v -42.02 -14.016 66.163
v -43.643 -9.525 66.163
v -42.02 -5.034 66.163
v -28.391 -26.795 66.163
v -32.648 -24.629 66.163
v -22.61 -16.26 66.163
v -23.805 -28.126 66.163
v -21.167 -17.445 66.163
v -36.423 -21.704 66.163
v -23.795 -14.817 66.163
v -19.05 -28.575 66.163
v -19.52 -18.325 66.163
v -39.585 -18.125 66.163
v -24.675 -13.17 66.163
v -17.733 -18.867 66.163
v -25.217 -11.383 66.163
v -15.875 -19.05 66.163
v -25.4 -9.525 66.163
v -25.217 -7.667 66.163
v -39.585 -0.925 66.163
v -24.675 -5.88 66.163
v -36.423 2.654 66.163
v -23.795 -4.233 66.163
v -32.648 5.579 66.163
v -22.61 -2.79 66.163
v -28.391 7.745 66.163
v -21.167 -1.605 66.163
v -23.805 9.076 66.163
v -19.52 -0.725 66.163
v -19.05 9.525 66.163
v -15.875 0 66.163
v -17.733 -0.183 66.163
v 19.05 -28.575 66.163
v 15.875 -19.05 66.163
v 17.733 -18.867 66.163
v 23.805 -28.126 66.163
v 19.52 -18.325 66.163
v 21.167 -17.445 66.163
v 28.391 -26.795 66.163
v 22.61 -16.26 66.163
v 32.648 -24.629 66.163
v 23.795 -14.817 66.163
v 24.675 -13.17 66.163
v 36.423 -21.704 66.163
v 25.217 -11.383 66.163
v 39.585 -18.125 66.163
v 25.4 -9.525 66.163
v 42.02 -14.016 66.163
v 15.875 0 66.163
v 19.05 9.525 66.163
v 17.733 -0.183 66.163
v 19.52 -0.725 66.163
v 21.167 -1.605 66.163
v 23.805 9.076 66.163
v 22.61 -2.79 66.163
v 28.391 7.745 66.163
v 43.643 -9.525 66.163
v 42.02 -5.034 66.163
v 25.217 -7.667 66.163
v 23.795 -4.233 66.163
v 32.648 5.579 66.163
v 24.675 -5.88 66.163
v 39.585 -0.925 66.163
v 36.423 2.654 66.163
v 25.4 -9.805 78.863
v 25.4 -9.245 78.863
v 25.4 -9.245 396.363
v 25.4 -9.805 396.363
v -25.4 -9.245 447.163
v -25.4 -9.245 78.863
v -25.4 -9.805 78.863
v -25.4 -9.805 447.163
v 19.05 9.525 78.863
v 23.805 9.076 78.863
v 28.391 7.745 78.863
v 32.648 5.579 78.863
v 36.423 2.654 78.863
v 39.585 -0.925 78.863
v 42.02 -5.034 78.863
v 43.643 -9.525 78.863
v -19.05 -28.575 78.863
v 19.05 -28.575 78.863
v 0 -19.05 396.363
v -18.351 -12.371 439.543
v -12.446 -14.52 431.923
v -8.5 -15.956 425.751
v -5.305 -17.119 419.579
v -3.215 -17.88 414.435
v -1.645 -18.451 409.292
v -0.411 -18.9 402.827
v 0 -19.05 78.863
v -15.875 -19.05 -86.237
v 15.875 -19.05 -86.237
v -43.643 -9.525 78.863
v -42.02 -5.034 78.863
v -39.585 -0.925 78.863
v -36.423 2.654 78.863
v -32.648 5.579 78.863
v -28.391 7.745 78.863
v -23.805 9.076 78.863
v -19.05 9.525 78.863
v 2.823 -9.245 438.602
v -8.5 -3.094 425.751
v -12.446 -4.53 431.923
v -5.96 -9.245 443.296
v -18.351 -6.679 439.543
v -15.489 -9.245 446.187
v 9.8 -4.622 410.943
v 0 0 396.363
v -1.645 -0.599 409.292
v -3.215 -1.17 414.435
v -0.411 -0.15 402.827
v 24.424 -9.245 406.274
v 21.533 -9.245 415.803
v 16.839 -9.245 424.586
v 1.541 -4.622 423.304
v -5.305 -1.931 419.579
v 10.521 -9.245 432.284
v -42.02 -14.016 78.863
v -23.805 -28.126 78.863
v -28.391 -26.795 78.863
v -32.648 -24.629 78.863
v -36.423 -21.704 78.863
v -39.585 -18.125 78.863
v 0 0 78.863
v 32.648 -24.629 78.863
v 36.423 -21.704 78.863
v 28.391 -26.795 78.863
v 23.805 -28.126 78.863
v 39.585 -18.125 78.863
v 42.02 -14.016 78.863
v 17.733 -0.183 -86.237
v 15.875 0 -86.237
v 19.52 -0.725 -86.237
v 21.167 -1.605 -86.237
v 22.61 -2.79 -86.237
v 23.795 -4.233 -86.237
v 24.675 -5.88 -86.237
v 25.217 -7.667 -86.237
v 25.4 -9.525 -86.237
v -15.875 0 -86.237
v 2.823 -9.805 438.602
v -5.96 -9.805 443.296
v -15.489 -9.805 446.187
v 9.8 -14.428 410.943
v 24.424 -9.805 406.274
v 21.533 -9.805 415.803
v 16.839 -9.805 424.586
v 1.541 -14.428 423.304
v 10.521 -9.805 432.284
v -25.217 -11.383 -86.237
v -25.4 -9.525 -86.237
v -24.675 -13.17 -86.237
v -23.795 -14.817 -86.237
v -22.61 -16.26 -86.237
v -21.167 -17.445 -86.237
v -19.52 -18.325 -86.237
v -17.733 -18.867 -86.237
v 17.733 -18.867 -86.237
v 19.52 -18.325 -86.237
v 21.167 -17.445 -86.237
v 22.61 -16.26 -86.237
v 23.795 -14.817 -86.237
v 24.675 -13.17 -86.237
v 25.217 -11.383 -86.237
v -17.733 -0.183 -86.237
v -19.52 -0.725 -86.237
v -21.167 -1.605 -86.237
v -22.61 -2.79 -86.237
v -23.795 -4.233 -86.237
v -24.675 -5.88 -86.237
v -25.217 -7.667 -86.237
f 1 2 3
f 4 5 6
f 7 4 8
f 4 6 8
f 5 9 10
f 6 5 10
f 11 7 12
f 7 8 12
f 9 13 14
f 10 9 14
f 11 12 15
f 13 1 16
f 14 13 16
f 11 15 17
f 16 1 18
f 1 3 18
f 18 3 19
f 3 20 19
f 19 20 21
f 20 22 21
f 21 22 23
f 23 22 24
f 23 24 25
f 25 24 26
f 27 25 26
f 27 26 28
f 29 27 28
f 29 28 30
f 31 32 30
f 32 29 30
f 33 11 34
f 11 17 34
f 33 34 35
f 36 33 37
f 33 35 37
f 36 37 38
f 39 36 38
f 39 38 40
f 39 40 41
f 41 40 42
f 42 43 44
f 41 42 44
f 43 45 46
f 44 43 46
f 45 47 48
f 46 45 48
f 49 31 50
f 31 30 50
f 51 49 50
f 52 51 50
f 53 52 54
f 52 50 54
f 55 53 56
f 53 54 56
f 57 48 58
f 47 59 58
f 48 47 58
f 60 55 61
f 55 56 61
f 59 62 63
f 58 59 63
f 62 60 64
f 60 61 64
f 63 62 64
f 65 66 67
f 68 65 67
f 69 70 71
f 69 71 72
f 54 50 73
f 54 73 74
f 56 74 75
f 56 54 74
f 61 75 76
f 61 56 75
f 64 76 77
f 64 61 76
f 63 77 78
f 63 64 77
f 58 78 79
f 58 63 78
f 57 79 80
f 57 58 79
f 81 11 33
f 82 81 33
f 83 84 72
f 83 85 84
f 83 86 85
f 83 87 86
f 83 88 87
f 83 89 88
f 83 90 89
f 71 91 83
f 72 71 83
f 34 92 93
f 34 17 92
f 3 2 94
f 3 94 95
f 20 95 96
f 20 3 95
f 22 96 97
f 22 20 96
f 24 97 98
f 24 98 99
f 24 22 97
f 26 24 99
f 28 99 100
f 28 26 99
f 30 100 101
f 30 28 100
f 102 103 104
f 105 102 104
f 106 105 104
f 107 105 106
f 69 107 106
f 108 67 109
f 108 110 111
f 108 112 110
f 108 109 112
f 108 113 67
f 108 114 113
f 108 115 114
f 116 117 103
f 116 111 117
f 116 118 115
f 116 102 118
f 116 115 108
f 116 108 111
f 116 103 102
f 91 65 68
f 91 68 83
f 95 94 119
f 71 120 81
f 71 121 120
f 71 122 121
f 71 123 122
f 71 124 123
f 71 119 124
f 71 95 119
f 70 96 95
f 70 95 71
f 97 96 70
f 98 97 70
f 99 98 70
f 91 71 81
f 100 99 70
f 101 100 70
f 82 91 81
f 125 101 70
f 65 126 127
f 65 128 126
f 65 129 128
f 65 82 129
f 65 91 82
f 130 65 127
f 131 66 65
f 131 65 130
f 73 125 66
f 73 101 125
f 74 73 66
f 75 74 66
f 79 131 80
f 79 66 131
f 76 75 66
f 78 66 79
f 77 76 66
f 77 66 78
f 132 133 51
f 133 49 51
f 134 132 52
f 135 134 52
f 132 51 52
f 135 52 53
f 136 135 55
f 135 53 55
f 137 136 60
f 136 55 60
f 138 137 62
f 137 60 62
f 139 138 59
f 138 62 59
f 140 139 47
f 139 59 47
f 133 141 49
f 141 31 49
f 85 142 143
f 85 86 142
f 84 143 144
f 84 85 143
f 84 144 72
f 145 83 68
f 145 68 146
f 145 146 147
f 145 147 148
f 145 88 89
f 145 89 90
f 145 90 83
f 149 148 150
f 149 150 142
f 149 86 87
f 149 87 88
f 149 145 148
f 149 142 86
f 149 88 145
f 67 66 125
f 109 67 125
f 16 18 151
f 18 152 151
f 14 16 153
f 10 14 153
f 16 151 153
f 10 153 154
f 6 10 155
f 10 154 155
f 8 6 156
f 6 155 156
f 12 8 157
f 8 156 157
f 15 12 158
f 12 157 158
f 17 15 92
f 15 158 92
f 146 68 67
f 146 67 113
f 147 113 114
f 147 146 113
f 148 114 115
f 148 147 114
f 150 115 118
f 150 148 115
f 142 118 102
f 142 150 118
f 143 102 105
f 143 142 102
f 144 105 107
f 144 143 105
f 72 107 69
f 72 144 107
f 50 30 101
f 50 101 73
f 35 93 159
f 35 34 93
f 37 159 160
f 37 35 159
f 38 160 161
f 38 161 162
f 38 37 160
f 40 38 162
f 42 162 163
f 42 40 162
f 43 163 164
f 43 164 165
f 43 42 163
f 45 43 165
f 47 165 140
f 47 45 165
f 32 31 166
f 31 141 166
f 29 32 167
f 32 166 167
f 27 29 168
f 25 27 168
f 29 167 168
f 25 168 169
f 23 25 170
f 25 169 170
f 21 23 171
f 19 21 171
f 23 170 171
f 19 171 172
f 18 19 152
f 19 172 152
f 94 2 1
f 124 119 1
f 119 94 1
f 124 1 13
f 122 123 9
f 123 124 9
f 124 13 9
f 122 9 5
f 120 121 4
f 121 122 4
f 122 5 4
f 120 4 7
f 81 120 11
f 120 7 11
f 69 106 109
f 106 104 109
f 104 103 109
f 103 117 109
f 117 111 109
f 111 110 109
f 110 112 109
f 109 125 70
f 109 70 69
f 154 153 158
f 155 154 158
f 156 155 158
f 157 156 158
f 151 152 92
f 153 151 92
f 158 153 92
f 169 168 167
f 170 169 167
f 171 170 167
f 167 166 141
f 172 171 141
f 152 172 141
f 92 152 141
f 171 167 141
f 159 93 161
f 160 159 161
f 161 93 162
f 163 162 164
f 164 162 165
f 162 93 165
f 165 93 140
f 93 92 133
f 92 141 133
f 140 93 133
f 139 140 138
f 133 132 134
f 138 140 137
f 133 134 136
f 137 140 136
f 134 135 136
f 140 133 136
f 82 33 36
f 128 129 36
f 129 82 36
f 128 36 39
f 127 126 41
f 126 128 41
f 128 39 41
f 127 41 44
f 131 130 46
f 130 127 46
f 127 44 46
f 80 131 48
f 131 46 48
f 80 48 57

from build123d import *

# Parameters (mm, degrees)
F1_DEPTH     = 19.05
F2_W         = 88.9
F2_H         = 38.1
F3_DEPTH     = 12.7
F4_W         = 50.8
F4_H         = 381
F5_DEPTH     = 19.05
F6_R         = 50.79999
F7_T1_DEPTH  = 434.1925462068
F7_T3_DEPTH  = 317.50001
F7_T5_DEPTH  = 65.8925562068
F7_T8_ANGLE  = 90
F7_T10_ANGLE = 90
F8_R         = 9.52499
F9_T1_DEPTH  = 139.7


# Not quite as in the source:
# - a fillet or chamfer that OpenCascade refuses, or shapes differently, is made with other operations: its cross-section is extruded or revolved along the edge and cut away or added
# - a fillet or chamfer is up to 0.001 mm smaller than in the source, because OpenCascade refuses the exact size


with BuildPart() as f1:
    # F0 (on Front) → F1 (new body)
    with BuildSketch(Plane.XZ):
        Polygon((-25.4, -86.237093463), (0, -86.237093463), (25.4, -86.237093463), (25.4, 66.162906537), (-25.4, 66.162906537), align=None)
    extrude(amount=F1_DEPTH)

    # F2 (on face) → F3 (join)
    with BuildSketch(Plane.XY.offset(66.162906537)):
        with Locations((0, -9.525)):
            Rectangle(F2_W, F2_H)
    extrude(amount=F3_DEPTH)

    # F4 (on face) → F5 (join)
    with BuildSketch(Plane(origin=(0, 0, 0), x_dir=(-1, 0, 0), z_dir=(0, 1, 0))):
        with Locations((0, 256.662906537)):
            Rectangle(F4_W, F4_H)
    extrude(amount=-F5_DEPTH)

    # F6 (radius 50.8 in the source; OpenCascade refuses exactly that, so slightly less here)
    f6_edges = [f1.edges().sort_by_distance(p)[0] for p in [
        (25.4, -9.525, 447.162907),
    ]]
    fillet(f6_edges, radius=F6_R)

    # F7: chamfer of 25.4 x 9.2448439504 on 6 edges, made by hand

    # F7_s2 → F7_t1 (cut)
    with BuildSketch(Plane.XY.offset(78.862906537)):
        Polygon((0, 0), (-25.4, -9.2448439504), (-25.4, 0), align=None)
        Polygon((0, -19.05), (-25.4, -9.8051560496), (-25.4, -19.05), align=None)
    extrude(amount=F7_T1_DEPTH, mode=Mode.SUBTRACT)

    # F7_s4 → F7_t3 (cut)
    with BuildSketch(Plane.XY.offset(78.862906537)):
        Polygon((25.4, -9.2448439504), (0, 0), (25.4, 0), align=None)
        Polygon((25.4, -9.8051560496), (0, -19.05), (25.4, -19.05), align=None)
    extrude(amount=F7_T3_DEPTH, mode=Mode.SUBTRACT)

    # F7_s6 → F7_t5 (cut)
    with BuildSketch(Plane.YZ.offset(-91.2925462068)):
        Polygon((-19.05, 421.762906537), (-9.8051560496, 447.162906537), (-19.05, 447.162906537), align=None)
        Polygon((0, 421.762906537), (-9.2448439504, 447.162906537), (0, 447.162906537), align=None)
    extrude(amount=F7_T5_DEPTH, mode=Mode.SUBTRACT)

    # F7_s7 → F7_t8 (revolve, cut)
    with BuildSketch(Plane.XY.offset(396.362916537)):
        Polygon((0, 0), (25.4, -9.2448439504), (25.4, 0), align=None)
    revolve(axis=Axis((-25.39999, 0, 396.362916537), (0, -1, 0)), revolution_arc=F7_T8_ANGLE, mode=Mode.SUBTRACT)

    # F7_s9 → F7_t10 (revolve, cut)
    with BuildSketch(Plane.XY.offset(396.362916537)):
        Polygon((25.4, -9.8051560496), (0, -19.05), (25.4, -19.05), align=None)
    revolve(axis=Axis((-25.39999, -19.05, 396.362916537), (0, -1, 0)), revolution_arc=F7_T10_ANGLE, mode=Mode.SUBTRACT)

    # F8 (radius 9.525 in the source; OpenCascade refuses exactly that, so slightly less here)
    f8_edges = [f1.edges().sort_by_distance(p)[0] for p in [
        (25.4, 0, -10.037093),
        (-25.4, 0, -10.037093),
        (-25.4, -19.05, -10.037093),
        (25.4, -19.05, -10.037093),
    ]]
    fillet(f8_edges, radius=F8_R)

    # F9: fillet of radius 25.4 on 4 edges, made by hand

    # F9_s2 → F9_t1 (cut)
    with BuildSketch(Plane.XY.offset(2.662906537)):
        with BuildLine():
            ThreePointArc((19.05, -28.575), (37.0105122421, -21.1355122421), (44.45, -3.175))
            Line((44.45, -3.175), (44.45, -28.575))
            Line((44.45, -28.575), (19.05, -28.575))
        make_face()
        with BuildLine():
            ThreePointArc((19.05, 9.525), (37.0105122421, 2.0855122421), (44.45, -15.875))
            Line((44.45, -15.875), (44.45, 9.525))
            Line((44.45, 9.525), (19.05, 9.525))
        make_face()
        with BuildLine():
            ThreePointArc((-44.45, -3.175), (-37.0105122421, -21.1355122421), (-19.05, -28.575))
            Line((-19.05, -28.575), (-44.45, -28.575))
            Line((-44.45, -28.575), (-44.45, -3.175))
        make_face()
        with BuildLine():
            ThreePointArc((-44.45, -15.875), (-37.0105122421, 2.0855122421), (-19.05, 9.525))
            Line((-19.05, 9.525), (-44.45, 9.525))
            Line((-44.45, 9.525), (-44.45, -15.875))
        make_face()
    extrude(amount=F9_T1_DEPTH, mode=Mode.SUBTRACT)


solid = f1.part
